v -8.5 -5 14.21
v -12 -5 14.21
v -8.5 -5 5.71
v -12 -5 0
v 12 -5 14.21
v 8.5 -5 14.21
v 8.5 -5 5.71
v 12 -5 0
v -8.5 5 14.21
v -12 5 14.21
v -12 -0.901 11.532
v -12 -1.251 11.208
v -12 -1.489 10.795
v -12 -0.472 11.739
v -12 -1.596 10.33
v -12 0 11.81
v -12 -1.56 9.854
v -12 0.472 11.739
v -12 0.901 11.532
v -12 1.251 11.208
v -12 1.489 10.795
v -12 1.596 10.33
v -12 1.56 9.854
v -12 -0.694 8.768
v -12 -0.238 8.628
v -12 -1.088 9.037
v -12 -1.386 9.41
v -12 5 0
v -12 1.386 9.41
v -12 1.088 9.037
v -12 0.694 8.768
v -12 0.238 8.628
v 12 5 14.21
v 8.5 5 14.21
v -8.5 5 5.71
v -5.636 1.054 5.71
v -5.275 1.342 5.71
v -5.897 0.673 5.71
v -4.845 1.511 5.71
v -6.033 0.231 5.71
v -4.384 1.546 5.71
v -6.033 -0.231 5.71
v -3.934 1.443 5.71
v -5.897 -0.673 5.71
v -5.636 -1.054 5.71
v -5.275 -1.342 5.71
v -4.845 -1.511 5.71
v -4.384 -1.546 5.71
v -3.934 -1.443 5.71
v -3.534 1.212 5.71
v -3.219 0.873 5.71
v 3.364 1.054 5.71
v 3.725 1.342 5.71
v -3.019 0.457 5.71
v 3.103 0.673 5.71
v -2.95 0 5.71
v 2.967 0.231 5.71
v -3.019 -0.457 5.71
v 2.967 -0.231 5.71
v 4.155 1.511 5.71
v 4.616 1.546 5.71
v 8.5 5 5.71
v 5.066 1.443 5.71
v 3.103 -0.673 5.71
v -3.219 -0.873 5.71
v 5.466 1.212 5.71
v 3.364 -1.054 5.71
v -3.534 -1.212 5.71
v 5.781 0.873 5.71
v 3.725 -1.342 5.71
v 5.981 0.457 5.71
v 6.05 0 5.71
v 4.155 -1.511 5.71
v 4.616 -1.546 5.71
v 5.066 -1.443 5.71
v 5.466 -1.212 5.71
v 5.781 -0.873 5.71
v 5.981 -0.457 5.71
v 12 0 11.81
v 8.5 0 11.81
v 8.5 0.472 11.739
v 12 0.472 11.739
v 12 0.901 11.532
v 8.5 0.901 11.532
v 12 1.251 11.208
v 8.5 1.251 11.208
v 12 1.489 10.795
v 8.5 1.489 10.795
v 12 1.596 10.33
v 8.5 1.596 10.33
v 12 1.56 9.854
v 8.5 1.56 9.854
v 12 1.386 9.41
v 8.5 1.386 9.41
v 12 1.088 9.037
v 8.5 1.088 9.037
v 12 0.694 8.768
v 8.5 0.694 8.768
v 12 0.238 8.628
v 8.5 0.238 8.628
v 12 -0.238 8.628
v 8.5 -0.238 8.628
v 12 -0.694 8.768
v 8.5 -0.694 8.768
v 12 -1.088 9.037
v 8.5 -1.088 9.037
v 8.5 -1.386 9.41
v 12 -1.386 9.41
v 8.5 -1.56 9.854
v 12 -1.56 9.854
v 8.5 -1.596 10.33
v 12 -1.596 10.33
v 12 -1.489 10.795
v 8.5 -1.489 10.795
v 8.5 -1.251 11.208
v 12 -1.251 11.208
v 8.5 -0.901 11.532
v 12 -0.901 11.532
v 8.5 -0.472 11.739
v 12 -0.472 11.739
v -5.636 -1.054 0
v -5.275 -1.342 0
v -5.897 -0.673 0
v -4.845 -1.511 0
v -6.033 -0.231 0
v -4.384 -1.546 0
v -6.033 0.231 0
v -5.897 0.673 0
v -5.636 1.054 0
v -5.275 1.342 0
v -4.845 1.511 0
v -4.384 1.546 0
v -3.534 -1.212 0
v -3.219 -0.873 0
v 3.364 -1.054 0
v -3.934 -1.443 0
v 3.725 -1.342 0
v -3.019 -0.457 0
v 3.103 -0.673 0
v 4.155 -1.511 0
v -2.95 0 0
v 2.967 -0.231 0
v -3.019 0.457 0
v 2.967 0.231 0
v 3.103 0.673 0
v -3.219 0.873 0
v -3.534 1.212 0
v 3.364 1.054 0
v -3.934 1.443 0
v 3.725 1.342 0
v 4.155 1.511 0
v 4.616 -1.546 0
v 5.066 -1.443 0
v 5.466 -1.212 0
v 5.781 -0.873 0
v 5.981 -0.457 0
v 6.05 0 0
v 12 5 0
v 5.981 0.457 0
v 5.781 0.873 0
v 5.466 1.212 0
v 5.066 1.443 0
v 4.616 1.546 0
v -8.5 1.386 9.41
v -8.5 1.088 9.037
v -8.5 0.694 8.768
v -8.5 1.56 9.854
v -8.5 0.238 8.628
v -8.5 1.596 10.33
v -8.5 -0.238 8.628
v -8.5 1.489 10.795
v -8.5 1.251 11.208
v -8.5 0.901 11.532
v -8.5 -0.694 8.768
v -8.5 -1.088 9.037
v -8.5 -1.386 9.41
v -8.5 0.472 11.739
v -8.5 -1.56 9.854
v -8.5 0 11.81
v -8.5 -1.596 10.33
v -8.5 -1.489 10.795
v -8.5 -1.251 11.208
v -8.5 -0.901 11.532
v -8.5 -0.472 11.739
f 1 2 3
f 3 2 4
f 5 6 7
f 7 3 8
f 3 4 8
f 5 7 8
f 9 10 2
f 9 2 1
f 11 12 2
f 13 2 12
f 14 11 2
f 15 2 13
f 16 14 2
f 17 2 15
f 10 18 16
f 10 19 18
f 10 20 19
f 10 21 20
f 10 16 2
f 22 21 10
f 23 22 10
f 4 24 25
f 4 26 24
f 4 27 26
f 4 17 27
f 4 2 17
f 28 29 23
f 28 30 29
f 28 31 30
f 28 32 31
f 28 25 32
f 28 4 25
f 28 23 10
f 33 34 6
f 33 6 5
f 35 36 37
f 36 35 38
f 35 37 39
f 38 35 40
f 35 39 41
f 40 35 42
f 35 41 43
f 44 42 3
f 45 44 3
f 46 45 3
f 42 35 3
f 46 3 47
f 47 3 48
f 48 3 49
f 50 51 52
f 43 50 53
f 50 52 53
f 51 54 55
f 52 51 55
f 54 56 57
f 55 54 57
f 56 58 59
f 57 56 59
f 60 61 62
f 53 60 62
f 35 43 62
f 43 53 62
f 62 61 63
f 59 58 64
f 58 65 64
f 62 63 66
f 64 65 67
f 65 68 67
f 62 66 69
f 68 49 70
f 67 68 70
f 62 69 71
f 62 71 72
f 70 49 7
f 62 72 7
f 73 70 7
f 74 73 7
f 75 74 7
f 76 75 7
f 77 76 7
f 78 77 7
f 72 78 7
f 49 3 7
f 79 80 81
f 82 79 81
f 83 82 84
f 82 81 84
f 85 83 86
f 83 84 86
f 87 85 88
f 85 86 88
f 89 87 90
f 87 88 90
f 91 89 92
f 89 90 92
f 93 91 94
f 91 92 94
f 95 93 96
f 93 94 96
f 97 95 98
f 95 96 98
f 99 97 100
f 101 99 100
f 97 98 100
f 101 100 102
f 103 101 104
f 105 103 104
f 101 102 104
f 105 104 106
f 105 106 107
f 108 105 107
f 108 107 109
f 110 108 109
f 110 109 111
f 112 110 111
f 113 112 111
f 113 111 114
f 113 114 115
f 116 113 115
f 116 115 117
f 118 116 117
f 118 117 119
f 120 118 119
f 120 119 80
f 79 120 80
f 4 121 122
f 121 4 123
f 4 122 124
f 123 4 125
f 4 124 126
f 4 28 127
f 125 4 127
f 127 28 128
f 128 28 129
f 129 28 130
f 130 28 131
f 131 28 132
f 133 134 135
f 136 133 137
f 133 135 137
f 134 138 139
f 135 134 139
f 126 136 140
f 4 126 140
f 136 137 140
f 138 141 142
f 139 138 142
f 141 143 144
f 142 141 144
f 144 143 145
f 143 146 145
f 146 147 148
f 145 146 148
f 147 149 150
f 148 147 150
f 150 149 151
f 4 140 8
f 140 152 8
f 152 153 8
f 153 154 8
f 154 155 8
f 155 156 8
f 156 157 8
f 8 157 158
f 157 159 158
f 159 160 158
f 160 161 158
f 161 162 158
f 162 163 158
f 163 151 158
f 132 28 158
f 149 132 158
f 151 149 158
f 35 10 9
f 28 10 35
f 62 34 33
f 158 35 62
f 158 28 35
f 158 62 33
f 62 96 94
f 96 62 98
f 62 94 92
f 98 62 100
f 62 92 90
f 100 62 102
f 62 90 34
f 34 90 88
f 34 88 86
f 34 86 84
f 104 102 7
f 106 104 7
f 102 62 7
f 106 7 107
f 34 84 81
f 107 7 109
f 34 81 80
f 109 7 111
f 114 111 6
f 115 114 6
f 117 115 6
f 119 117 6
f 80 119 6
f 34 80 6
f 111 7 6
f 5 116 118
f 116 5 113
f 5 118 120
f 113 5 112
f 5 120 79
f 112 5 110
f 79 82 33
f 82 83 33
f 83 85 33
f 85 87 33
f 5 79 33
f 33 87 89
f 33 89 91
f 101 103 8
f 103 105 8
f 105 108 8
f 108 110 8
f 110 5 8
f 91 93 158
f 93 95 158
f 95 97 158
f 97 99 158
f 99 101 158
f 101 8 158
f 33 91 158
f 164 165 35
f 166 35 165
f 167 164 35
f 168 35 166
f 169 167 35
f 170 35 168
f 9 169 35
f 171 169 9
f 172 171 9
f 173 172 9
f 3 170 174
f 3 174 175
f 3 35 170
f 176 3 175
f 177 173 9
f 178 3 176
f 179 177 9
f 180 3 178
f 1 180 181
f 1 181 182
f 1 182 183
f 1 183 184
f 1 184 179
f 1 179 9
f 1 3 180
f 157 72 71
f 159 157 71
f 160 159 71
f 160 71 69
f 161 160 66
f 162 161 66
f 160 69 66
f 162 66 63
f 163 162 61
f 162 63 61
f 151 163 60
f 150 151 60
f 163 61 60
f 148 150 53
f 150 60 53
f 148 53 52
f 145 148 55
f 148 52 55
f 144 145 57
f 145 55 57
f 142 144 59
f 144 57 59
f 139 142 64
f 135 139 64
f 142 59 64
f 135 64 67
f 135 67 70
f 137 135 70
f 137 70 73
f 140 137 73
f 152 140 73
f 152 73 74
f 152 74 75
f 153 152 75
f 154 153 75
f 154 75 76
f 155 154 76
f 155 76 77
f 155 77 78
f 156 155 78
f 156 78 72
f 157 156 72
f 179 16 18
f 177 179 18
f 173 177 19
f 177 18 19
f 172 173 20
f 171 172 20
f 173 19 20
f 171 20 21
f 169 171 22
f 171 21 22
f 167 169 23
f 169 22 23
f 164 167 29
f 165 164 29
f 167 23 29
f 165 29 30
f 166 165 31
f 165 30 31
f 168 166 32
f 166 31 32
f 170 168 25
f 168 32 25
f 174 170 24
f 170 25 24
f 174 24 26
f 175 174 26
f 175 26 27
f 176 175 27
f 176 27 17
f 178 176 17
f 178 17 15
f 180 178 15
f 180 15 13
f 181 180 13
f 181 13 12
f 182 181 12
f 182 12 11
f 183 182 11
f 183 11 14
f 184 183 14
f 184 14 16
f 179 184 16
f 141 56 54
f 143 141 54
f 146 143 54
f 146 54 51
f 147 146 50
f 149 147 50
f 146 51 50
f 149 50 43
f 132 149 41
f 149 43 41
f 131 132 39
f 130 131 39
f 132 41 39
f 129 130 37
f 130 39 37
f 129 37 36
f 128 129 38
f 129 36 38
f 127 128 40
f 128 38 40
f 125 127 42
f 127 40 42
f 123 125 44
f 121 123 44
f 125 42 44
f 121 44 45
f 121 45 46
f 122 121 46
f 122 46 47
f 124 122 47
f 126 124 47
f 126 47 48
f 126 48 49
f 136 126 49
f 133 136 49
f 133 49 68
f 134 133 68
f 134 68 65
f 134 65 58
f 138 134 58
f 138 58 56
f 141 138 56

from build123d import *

# Parameters (mm, degrees)
CROQUIS1_W              = 24
CROQUIS1_H              = 10
SALIENTE_EXTRUIR1_DEPTH = 14.21
CROQUIS2_W              = 17
CROQUIS2_H              = 8.5
CORTAR_EXTRUIR1_DEPTH   = 12
CROQUIS3_R              = 1.6
CORTAR_EXTRUIR2_DEPTH   = 29.335915373
CROQUIS4_R              = 1.55
CORTAR_EXTRUIR3_DEPTH   = 12


with BuildPart() as part:
    # Croquis1 → Saliente-Extruir1 (new body)
    with BuildSketch(Plane.XY):
        Rectangle(CROQUIS1_W, CROQUIS1_H)
    extrude(amount=SALIENTE_EXTRUIR1_DEPTH)

    # Croquis2 → Cortar-Extruir1 (cut)
    with BuildSketch(Plane.XZ.offset(5)):
        with Locations((0, 9.96)):
            Rectangle(CROQUIS2_W, CROQUIS2_H)
    extrude(amount=-CORTAR_EXTRUIR1_DEPTH, mode=Mode.SUBTRACT)

    # Croquis3 → Cortar-Extruir2 (cut, through all)
    with BuildSketch(Plane.ZY.offset(12)):
        with Locations((10.21, 0)):
            Circle(CROQUIS3_R)
    extrude(amount=-CORTAR_EXTRUIR2_DEPTH, mode=Mode.SUBTRACT)

    # Croquis4 → Cortar-Extruir3 (cut)
    with BuildSketch(Plane.XY.offset(5.71)):
        with Locations((-4.5, 0)):
            Circle(CROQUIS4_R)
        with Locations((4.5, 0)):
            Circle(CROQUIS4_R)
    extrude(amount=-CORTAR_EXTRUIR3_DEPTH, mode=Mode.SUBTRACT)


solid = part.part
